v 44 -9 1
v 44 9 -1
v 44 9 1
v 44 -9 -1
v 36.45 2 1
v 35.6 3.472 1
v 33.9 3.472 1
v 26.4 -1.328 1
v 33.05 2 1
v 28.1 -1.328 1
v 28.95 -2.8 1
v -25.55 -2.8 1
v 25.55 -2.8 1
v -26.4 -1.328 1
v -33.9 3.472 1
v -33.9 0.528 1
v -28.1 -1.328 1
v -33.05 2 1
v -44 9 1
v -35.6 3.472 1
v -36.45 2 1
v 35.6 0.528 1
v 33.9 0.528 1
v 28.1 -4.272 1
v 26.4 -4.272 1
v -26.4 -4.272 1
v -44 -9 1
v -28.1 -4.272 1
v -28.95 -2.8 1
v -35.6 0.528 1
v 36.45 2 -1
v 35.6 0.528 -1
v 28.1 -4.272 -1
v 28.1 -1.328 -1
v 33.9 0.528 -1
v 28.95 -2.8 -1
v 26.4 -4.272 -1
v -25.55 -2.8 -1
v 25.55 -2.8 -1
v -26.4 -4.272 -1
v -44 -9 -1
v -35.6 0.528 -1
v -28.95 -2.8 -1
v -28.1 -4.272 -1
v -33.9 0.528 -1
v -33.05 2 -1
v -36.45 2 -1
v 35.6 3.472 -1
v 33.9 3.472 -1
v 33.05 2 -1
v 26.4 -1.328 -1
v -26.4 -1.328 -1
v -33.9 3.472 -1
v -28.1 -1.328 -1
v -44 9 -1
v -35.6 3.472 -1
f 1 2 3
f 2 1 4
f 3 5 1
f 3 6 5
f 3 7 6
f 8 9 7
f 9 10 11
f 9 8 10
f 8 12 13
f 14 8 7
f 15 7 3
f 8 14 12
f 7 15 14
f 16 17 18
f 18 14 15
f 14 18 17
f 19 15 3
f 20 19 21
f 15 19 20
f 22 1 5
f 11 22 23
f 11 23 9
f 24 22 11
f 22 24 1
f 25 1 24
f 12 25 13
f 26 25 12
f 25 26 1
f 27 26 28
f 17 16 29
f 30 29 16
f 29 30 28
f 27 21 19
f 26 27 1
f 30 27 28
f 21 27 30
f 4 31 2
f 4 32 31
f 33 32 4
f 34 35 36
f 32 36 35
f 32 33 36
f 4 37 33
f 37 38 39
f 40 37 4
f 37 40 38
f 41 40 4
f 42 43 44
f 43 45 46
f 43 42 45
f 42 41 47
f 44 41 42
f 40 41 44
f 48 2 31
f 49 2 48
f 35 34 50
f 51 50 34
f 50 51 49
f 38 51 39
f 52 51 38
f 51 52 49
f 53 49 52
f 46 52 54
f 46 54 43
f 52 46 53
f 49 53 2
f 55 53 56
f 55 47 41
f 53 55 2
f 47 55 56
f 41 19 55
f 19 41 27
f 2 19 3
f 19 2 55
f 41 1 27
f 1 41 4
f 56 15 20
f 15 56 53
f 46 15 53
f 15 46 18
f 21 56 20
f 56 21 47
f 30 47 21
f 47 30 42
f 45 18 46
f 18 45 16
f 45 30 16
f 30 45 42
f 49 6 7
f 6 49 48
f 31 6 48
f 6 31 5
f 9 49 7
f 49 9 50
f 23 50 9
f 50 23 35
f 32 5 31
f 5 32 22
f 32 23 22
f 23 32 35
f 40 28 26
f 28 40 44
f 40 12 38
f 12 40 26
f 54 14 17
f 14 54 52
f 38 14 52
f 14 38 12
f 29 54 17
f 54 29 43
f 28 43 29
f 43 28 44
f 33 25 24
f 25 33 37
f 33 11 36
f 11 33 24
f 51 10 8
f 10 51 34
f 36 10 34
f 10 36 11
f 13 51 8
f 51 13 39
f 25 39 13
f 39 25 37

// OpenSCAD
// Base dimensions
base_width = 18;
base_length = 88;
base_thickness = 2; // Adjust as needed

// Outer hole parameters
outer_hole_diameter = 3.4; // Diameter with tolerance
outer_hole_spacing = 69.5;
outer_hole_offset_y = 2; // Offset of the outer holes from the base center (y-axis)

// Calculate outer hole center positions
outer_hole1_x = -outer_hole_spacing / 2;
outer_hole2_x = outer_hole_spacing / 2;


// Inner hole parameters
inner_hole_diameter = 3.4;
inner_hole_spacing = 54.5;
// Relative offset of the inner holes from the outer holes (along y-axis)
// A negative value places inner holes "below" (lesser y) the outer holes
inner_hole_relative_offset_y = -4.8;

// Calculate inner hole center positions (relative to the base center)
inner_hole1_x = -inner_hole_spacing / 2;
inner_hole2_x = inner_hole_spacing / 2;
// Calculate absolute Y position for inner holes
inner_hole_y_pos = outer_hole_offset_y + inner_hole_relative_offset_y;

// Create the base plate
module base() {
  cube([base_length, base_width, base_thickness], center = true);
}

// Create an outer hole (using cylinder for subtraction)
module outer_hole() {
  // Use a slightly taller cylinder for clean subtraction
  cylinder(d = outer_hole_diameter, h = base_thickness + 1, center = true);
}

// Create an inner hole (using cylinder for subtraction)
module inner_hole() {
  // Use a slightly taller cylinder for clean subtraction
  cylinder(d = inner_hole_diameter, h = base_thickness + 1, center = true);
}


difference() {
  // 1. Start with the base
  base();

  // 2. Subtract the main holes
  // Outer holes
  translate([outer_hole1_x, outer_hole_offset_y, 0]) outer_hole();
  translate([outer_hole2_x, outer_hole_offset_y, 0]) outer_hole();
  
  // Inner holes
  translate([inner_hole1_x, inner_hole_y_pos, 0]) inner_hole();
  translate([inner_hole2_x, inner_hole_y_pos, 0]) inner_hole();

}
